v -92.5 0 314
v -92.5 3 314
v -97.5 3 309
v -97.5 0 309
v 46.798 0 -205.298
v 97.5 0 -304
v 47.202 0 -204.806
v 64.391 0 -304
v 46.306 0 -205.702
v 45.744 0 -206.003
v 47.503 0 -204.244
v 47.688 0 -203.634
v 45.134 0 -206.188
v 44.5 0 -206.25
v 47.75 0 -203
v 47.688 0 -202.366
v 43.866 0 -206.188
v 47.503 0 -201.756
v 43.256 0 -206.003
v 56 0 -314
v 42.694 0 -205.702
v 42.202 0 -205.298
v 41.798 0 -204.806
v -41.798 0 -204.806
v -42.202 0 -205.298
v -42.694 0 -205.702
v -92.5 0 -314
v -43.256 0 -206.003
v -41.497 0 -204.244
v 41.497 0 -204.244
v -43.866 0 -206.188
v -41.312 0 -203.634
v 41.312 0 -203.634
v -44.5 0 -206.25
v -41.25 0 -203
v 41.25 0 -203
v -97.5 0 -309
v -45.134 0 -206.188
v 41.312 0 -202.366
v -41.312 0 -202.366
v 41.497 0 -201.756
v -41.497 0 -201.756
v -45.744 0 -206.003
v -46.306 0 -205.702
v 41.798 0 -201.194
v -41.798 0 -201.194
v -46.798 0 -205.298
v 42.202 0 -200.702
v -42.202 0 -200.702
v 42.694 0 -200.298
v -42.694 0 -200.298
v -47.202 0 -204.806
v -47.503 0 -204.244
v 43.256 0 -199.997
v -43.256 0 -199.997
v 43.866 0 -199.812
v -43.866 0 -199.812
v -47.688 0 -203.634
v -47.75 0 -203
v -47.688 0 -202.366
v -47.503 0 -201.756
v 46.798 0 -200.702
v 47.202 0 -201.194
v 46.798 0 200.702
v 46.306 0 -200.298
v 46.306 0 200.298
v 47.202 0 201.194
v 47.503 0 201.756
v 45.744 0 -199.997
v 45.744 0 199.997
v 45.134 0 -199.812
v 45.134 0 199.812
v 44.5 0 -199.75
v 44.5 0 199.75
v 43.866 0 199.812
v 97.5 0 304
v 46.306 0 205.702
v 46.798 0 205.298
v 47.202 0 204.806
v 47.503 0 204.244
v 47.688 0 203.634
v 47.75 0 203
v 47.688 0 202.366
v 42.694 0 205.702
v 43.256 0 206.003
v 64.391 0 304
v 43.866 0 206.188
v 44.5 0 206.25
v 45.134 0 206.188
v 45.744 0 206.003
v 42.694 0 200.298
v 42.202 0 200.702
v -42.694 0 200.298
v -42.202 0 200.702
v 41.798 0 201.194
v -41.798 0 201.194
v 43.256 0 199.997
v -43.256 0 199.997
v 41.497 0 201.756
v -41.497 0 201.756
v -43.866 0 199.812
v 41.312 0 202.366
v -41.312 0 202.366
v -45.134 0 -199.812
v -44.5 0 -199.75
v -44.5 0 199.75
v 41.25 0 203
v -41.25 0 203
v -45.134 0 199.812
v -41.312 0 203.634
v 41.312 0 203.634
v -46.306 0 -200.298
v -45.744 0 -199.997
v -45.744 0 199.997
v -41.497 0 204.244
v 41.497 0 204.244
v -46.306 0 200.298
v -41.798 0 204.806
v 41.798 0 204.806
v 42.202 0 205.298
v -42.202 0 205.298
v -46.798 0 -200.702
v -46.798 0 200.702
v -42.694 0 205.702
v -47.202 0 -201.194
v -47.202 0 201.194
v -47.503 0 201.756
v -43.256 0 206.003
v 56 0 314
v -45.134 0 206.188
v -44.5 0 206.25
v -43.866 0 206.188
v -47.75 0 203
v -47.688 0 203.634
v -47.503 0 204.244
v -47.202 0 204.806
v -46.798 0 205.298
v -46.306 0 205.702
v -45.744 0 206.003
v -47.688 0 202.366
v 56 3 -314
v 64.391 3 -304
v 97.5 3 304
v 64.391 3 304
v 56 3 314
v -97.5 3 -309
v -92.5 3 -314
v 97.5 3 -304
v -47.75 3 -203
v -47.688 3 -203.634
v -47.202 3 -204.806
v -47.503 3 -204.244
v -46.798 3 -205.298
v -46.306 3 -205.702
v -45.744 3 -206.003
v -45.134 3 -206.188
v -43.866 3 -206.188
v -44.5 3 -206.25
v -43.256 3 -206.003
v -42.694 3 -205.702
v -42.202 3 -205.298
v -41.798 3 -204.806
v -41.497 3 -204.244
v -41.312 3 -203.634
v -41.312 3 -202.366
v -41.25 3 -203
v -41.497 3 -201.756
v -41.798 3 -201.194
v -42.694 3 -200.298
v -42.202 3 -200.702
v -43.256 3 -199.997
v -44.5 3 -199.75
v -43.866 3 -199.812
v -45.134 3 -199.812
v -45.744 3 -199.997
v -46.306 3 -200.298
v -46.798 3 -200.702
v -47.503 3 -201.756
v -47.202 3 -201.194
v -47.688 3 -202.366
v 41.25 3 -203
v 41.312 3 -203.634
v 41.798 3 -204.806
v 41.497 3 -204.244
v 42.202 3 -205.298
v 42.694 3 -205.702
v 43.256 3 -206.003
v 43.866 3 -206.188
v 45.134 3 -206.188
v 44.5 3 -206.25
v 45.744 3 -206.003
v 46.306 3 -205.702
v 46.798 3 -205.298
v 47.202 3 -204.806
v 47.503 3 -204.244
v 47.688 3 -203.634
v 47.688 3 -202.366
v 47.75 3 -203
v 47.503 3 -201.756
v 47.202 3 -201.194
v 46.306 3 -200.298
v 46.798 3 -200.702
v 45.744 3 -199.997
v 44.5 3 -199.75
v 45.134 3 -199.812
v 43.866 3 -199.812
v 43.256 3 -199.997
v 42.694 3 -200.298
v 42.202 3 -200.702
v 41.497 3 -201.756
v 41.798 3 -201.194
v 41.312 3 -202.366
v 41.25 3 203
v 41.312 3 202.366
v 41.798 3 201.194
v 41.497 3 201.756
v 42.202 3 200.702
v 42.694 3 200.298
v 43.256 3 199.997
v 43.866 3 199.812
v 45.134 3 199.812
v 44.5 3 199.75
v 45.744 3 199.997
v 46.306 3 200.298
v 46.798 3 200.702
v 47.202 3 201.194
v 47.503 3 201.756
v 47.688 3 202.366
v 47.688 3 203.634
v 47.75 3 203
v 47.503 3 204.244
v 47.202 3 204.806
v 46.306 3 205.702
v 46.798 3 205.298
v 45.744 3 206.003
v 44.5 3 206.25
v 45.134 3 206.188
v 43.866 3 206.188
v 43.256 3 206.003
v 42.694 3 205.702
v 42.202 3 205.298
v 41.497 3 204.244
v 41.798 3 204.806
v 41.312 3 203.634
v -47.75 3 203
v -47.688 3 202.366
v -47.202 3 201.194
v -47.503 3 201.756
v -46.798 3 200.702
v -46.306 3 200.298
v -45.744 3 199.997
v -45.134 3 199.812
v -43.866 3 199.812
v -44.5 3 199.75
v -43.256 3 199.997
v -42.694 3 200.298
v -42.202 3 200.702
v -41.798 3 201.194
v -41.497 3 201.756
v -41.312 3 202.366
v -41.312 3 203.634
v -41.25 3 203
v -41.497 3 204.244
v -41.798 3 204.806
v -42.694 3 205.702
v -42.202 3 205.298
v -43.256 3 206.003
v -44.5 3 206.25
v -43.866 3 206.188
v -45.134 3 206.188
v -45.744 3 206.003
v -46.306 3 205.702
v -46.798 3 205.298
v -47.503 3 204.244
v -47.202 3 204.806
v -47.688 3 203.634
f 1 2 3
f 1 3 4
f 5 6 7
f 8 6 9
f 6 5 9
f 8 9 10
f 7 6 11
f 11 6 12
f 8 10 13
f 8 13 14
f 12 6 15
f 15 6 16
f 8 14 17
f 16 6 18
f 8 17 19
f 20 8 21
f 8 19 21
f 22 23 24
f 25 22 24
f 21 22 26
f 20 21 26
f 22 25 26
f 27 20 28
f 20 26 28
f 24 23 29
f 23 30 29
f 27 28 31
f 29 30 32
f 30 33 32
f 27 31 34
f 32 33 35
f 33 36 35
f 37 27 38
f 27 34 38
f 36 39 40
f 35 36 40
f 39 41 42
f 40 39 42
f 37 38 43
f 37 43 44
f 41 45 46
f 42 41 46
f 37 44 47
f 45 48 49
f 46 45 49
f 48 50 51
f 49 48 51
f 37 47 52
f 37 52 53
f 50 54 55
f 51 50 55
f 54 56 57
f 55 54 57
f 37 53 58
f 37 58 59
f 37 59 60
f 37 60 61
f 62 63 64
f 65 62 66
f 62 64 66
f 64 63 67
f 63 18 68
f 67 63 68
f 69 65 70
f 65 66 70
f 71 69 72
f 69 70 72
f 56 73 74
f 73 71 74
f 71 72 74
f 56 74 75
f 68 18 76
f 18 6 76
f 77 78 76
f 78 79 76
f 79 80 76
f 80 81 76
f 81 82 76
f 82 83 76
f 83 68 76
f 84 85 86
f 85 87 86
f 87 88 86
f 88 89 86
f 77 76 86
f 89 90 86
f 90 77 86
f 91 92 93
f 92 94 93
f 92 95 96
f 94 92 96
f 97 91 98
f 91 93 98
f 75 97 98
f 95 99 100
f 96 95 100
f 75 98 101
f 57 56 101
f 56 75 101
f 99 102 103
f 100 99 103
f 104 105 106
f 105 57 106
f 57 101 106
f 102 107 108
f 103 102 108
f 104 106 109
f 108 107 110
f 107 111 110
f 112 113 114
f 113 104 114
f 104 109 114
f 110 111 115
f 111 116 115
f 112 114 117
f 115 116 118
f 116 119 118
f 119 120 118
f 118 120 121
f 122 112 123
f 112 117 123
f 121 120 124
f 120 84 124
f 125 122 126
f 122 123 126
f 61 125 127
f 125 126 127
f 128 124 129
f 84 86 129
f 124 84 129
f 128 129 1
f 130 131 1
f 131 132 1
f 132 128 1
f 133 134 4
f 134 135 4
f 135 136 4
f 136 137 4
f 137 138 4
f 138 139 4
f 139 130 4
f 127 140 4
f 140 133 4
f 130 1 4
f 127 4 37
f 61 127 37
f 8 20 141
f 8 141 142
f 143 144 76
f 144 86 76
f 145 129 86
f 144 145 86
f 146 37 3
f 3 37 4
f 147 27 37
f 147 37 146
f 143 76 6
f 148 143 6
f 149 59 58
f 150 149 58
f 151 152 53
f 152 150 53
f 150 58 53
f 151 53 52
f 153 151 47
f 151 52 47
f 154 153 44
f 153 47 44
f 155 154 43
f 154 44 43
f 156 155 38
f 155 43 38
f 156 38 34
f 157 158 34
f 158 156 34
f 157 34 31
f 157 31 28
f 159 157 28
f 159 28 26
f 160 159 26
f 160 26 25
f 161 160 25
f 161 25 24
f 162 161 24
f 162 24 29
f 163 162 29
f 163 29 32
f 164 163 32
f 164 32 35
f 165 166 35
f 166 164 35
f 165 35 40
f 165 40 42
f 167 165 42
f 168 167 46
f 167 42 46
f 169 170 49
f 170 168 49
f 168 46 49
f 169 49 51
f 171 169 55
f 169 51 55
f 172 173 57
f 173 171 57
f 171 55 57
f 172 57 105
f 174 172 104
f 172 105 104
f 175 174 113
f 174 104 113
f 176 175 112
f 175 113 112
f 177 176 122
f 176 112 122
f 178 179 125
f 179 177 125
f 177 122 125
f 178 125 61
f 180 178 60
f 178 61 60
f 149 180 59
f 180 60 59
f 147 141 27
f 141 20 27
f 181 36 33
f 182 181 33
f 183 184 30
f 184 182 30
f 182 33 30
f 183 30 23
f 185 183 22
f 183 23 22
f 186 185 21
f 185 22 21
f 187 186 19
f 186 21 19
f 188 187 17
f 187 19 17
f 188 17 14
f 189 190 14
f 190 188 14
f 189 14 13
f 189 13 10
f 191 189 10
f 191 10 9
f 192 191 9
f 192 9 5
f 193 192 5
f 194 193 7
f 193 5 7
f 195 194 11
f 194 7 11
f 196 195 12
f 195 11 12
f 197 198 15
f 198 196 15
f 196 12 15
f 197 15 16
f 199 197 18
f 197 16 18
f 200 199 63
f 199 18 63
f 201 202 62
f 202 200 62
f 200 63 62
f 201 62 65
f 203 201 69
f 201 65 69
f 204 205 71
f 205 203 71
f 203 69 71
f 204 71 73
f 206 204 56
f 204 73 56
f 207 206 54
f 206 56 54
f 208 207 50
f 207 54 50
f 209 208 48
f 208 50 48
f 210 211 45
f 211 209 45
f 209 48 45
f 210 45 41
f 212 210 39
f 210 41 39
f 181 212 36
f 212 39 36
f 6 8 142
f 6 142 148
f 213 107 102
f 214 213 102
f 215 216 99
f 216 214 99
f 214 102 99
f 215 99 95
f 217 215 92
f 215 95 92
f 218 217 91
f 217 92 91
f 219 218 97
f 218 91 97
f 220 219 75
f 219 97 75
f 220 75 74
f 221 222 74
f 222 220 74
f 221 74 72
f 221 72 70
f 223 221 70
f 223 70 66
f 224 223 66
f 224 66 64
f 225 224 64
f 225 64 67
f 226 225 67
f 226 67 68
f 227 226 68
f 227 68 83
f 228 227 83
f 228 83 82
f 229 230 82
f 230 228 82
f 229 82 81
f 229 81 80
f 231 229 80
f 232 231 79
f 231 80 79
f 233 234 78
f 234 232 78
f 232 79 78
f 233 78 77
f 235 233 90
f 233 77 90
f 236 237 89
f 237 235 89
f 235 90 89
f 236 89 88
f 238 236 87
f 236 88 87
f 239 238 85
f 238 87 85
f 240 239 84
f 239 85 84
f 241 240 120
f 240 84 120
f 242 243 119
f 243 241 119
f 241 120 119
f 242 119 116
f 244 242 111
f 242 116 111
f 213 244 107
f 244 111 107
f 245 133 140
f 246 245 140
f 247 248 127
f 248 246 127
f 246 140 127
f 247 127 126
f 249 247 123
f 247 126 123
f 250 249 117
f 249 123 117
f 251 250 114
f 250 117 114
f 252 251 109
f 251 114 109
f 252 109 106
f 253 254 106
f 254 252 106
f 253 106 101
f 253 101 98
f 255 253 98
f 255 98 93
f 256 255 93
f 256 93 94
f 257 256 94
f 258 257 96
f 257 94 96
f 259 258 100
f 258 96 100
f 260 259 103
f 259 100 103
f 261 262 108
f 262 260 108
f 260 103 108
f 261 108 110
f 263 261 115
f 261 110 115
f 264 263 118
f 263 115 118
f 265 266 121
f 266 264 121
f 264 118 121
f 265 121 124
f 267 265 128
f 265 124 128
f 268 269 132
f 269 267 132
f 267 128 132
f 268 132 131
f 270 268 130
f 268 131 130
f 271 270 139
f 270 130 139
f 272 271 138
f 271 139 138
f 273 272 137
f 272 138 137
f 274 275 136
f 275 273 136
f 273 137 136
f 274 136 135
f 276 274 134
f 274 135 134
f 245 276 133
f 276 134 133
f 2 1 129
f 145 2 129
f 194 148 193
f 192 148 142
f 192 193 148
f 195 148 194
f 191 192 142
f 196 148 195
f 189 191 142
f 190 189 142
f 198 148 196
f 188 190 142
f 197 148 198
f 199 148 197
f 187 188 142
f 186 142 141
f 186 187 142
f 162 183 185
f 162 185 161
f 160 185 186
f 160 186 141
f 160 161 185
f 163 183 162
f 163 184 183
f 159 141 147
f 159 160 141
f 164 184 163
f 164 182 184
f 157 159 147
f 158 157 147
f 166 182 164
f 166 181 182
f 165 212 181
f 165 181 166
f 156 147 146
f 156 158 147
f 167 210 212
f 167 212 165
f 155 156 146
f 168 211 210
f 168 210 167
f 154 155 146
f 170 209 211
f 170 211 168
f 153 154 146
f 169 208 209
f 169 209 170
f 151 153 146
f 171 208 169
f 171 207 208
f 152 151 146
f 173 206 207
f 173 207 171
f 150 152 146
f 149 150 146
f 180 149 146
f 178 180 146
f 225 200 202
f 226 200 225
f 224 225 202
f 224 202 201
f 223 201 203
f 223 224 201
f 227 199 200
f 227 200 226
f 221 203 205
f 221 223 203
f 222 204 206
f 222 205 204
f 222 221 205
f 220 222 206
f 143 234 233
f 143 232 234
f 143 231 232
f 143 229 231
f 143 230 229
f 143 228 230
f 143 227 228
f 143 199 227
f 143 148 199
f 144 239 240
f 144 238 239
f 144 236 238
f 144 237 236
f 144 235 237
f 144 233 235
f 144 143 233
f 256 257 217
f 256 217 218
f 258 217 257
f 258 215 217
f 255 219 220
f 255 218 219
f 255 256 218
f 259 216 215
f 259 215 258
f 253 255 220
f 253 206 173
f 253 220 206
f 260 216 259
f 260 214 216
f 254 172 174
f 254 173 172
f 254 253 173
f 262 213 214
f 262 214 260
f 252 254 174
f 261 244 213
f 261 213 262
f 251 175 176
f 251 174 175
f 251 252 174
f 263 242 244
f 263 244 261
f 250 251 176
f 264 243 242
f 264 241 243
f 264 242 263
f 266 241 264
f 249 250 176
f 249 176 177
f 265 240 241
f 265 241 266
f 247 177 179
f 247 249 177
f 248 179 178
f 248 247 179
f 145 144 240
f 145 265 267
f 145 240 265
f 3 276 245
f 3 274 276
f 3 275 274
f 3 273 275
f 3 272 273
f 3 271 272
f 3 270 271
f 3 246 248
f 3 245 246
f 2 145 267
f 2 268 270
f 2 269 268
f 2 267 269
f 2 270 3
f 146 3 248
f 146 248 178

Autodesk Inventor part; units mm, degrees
ref_plane "YZ Plane" through (0, 0, 0) normal (1, 0, 0) x (0, 1, 0)
ref_plane "XZ Plane" through (0, 0, 0) normal (0, 1, 0) x (-1, 0, 0)
ref_plane "XY Plane" through (0, 0, 0) normal (0, 0, 1) x (1, 0, 0)
sketch "Skizze1" plane through (0, 0, 0) normal (0, 1, 0) x (-1, 0, 0)
  line L0 (97.5, 314) -> (-97.5, 314)
  line L1 (-97.5, 314) -> (-97.5, -314)
  line L2 (-97.5, -314) -> (97.5, -314)
  line L3 (97.5, -314) -> (97.5, 314)
  line L4 (97.5, 314) -> (-97.5, -314) construction
  line L5 (-97.5, 314) -> (97.5, -314) construction
  line L6 (-136.5, 0) -> (136.5, 0) construction
  line L7 (0, -439.6) -> (0, 439.6) construction
  circle A0 centre (44.5, -203) radius 3.25
  circle A1 centre (-44.5, -203) radius 3.25
  circle A2 centre (44.5, 203) radius 3.25
  circle A3 centre (-44.5, 203) radius 3.25
  line L8 (-56, -314) -> (-64.391, -304)
  line L9 (-64.391, -304) -> (-97.5, -304)
  line L10 (-56, 314) -> (-64.391, 304)
  line L11 (-64.391, 304) -> (-97.5, 304)
  point P0 (0, 0)
  point P1 (-56, 314)
  dimension "d0" = 628
  dimension "d1" = 195
  dimension "d2" = 6.5
  dimension "d3" = 44.5
  dimension "d4" = 111
  dimension "d10" = 41.5
  dimension "d11" = 10
  dimension "d12" = 50
extrude "Extrusion1" add sketch "Skizze1" along normal blind 3 contours L3 L2 L8 L9 L1 L11 L10 L0
chamfer "Fase1" distance 5 angle 45 2 edges at (-97.5, 1.5, 314) (-97.5, 1.5, -314)
properties part number "enc-BackPanel Top for 4040"
